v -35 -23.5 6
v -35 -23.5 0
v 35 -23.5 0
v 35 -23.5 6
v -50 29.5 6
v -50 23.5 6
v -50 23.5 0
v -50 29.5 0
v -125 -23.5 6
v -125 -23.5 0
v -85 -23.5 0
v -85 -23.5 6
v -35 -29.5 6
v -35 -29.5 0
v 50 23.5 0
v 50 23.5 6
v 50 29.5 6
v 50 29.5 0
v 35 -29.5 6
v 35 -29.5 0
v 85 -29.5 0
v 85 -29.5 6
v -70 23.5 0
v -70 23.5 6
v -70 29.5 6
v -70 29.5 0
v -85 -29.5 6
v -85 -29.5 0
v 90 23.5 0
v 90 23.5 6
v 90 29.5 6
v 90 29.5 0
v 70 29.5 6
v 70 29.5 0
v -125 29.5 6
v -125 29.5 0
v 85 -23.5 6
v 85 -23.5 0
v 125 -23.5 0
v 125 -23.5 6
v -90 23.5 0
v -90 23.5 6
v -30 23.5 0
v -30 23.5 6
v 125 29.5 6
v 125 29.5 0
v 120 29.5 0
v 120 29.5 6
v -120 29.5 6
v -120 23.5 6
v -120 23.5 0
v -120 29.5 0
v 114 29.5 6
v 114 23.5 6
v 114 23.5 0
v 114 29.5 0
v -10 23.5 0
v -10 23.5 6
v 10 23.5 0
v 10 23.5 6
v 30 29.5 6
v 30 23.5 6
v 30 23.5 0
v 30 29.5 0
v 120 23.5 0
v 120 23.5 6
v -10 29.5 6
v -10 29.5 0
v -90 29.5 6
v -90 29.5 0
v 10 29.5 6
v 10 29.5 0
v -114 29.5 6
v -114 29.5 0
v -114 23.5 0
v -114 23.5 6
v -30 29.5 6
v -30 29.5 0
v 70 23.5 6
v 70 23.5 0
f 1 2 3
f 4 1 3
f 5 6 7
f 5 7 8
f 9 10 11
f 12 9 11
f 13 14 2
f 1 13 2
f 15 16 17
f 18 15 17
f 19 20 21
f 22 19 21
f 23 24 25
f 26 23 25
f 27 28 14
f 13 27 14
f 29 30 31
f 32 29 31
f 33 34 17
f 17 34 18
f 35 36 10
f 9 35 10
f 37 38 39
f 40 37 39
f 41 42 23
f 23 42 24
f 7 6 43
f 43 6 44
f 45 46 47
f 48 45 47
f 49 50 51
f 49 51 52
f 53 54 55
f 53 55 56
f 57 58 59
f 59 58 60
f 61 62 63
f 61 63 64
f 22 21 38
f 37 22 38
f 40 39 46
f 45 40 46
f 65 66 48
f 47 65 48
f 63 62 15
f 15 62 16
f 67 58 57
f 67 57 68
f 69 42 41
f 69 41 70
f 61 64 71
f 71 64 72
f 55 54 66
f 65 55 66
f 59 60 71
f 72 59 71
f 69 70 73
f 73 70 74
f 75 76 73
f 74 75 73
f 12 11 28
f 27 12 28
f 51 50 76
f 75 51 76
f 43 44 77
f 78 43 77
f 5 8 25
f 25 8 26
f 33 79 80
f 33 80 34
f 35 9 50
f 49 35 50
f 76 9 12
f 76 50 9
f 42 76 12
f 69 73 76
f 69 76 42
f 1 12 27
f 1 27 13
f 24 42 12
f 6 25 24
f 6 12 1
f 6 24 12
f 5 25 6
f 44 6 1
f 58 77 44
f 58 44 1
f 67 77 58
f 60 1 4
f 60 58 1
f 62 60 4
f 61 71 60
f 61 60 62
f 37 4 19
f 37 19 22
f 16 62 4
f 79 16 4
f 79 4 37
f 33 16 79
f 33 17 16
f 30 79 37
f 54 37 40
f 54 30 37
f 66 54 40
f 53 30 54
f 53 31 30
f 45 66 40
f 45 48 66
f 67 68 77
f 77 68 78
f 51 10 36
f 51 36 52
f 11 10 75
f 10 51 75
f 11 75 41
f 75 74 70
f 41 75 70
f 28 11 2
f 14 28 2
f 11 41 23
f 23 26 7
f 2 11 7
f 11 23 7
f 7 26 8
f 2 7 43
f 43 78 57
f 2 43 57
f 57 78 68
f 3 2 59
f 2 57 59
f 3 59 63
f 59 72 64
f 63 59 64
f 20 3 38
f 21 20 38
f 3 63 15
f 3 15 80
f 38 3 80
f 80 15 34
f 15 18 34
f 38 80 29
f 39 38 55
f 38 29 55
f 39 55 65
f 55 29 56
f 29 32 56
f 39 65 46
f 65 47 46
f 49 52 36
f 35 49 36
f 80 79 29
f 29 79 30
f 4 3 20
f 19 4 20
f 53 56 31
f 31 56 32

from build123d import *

# Parameters (mm, degrees)
BOSS_EXTRUDE1_DEPTH = 6
CUT_EXTRUDE1_REACH  = 8
SKETCH2_W           = 20
SKETCH2_H           = 6
SKETCH2_W_2         = 6


with BuildPart() as part:
    # Sketch1 → Boss-Extrude1 (new body)
    with BuildSketch(Plane.XY):
        Polygon((-85, -23.5), (-85, -29.5), (-35, -29.5), (-35, -23.5), (35, -23.5), (35, -29.5), (85, -29.5), (85, -23.5), (125, -23.5), (125, 29.5), (-125, 29.5), (-125, -23.5), align=None)
    extrude(amount=BOSS_EXTRUDE1_DEPTH)

    # Sketch2 → Cut-Extrude1 (cut, up to next)
    with BuildSketch(Plane.XY.offset(6), mode=Mode.PRIVATE) as cut_extrude1_sk1:
        with Locations((-80, 26.5)):
            Rectangle(SKETCH2_W, SKETCH2_H)
    cut_extrude1_tool1 = extrude(cut_extrude1_sk1.sketch, amount=-CUT_EXTRUDE1_REACH, mode=Mode.PRIVATE) & part.part
    add(cut_extrude1_tool1.solids().sort_by_distance((-80, 26.5, 6))[0], mode=Mode.SUBTRACT)
    # Sketch2 → Cut-Extrude1 (cut, up to next)
    with BuildSketch(Plane.XY.offset(6), mode=Mode.PRIVATE) as cut_extrude1_sk2:
        with Locations((-40, 26.5)):
            Rectangle(SKETCH2_W, SKETCH2_H)
    cut_extrude1_tool2 = extrude(cut_extrude1_sk2.sketch, amount=-CUT_EXTRUDE1_REACH, mode=Mode.PRIVATE) & part.part
    add(cut_extrude1_tool2.solids().sort_by_distance((-40, 26.5, 6))[0], mode=Mode.SUBTRACT)
    # Sketch2 → Cut-Extrude1 (cut, up to next)
    with BuildSketch(Plane.XY.offset(6), mode=Mode.PRIVATE) as cut_extrude1_sk3:
        with Locations((0, 26.5)):
            Rectangle(SKETCH2_W, SKETCH2_H)
    cut_extrude1_tool3 = extrude(cut_extrude1_sk3.sketch, amount=-CUT_EXTRUDE1_REACH, mode=Mode.PRIVATE) & part.part
    add(cut_extrude1_tool3.solids().sort_by_distance((0, 26.5, 6))[0], mode=Mode.SUBTRACT)
    # Sketch2 → Cut-Extrude1 (cut, up to next)
    with BuildSketch(Plane.XY.offset(6), mode=Mode.PRIVATE) as cut_extrude1_sk4:
        with Locations((40, 26.5)):
            Rectangle(SKETCH2_W, SKETCH2_H)
    cut_extrude1_tool4 = extrude(cut_extrude1_sk4.sketch, amount=-CUT_EXTRUDE1_REACH, mode=Mode.PRIVATE) & part.part
    add(cut_extrude1_tool4.solids().sort_by_distance((40, 26.5, 6))[0], mode=Mode.SUBTRACT)
    # Sketch2 → Cut-Extrude1 (cut, up to next)
    with BuildSketch(Plane.XY.offset(6), mode=Mode.PRIVATE) as cut_extrude1_sk5:
        with Locations((80, 26.5)):
            Rectangle(SKETCH2_W, SKETCH2_H)
    cut_extrude1_tool5 = extrude(cut_extrude1_sk5.sketch, amount=-CUT_EXTRUDE1_REACH, mode=Mode.PRIVATE) & part.part
    add(cut_extrude1_tool5.solids().sort_by_distance((80, 26.5, 6))[0], mode=Mode.SUBTRACT)
    # Sketch2 → Cut-Extrude1 (cut, up to next)
    with BuildSketch(Plane.XY.offset(6), mode=Mode.PRIVATE) as cut_extrude1_sk6:
        with Locations((-117, 26.5)):
            Rectangle(SKETCH2_W_2, SKETCH2_H)
    cut_extrude1_tool6 = extrude(cut_extrude1_sk6.sketch, amount=-CUT_EXTRUDE1_REACH, mode=Mode.PRIVATE) & part.part
    add(cut_extrude1_tool6.solids().sort_by_distance((-117, 26.5, 6))[0], mode=Mode.SUBTRACT)
    # Sketch2 → Cut-Extrude1 (cut, up to next)
    with BuildSketch(Plane.XY.offset(6), mode=Mode.PRIVATE) as cut_extrude1_sk7:
        with Locations((117, 26.5)):
            Rectangle(SKETCH2_W_2, SKETCH2_H)
    cut_extrude1_tool7 = extrude(cut_extrude1_sk7.sketch, amount=-CUT_EXTRUDE1_REACH, mode=Mode.PRIVATE) & part.part
    add(cut_extrude1_tool7.solids().sort_by_distance((117, 26.5, 6))[0], mode=Mode.SUBTRACT)


solid = part.part
